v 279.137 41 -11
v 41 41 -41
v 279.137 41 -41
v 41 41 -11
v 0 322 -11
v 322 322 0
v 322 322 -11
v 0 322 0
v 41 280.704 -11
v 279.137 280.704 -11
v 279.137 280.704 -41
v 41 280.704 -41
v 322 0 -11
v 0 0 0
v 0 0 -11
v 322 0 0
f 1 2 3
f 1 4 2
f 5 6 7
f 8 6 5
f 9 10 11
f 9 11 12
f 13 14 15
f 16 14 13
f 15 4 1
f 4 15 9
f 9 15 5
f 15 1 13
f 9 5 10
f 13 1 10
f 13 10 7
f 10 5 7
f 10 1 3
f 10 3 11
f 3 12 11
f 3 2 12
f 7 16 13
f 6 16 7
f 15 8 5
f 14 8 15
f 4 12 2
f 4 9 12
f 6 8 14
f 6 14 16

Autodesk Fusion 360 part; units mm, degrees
sketch "Sketch1" plane through (0, 0, 0) normal (0, 0, 1) x (1, 0, 0)
  line L0 (0, 0) -> (322, 0)
  line L1 (322, 0) -> (322, 322)
  line L2 (322, 322) -> (0, 322)
  line L3 (0, 322) -> (0, 0)
  dimension "d1" = 322
  dimension "d2" = 322
extrude "Extrude1" add sketch "Sketch1" against normal blind 11
sketch "Sketch2" plane through (0, 0, -11) normal (0, 0, -1) x (1, 0, 0)
  line L0 (0, 0) -> (0, -322)
  line L1 (0, -322) -> (322, -322)
  line L2 (322, -322) -> (322, 0)
  line L3 (322, 0) -> (0, 0)
  line L4 (41, -41) -> (279.137, -41)
  line L5 (279.137, -41) -> (279.137, -280.7037)
  line L6 (279.137, -280.7037) -> (41, -280.7037)
  line L7 (41, -280.7037) -> (41, -41)
  dimension "d7" = 41
  dimension "d8" = 41
extrude "Extrude2" add sketch "Sketch2" along normal blind 30 contours L4 L5 L6 L7
